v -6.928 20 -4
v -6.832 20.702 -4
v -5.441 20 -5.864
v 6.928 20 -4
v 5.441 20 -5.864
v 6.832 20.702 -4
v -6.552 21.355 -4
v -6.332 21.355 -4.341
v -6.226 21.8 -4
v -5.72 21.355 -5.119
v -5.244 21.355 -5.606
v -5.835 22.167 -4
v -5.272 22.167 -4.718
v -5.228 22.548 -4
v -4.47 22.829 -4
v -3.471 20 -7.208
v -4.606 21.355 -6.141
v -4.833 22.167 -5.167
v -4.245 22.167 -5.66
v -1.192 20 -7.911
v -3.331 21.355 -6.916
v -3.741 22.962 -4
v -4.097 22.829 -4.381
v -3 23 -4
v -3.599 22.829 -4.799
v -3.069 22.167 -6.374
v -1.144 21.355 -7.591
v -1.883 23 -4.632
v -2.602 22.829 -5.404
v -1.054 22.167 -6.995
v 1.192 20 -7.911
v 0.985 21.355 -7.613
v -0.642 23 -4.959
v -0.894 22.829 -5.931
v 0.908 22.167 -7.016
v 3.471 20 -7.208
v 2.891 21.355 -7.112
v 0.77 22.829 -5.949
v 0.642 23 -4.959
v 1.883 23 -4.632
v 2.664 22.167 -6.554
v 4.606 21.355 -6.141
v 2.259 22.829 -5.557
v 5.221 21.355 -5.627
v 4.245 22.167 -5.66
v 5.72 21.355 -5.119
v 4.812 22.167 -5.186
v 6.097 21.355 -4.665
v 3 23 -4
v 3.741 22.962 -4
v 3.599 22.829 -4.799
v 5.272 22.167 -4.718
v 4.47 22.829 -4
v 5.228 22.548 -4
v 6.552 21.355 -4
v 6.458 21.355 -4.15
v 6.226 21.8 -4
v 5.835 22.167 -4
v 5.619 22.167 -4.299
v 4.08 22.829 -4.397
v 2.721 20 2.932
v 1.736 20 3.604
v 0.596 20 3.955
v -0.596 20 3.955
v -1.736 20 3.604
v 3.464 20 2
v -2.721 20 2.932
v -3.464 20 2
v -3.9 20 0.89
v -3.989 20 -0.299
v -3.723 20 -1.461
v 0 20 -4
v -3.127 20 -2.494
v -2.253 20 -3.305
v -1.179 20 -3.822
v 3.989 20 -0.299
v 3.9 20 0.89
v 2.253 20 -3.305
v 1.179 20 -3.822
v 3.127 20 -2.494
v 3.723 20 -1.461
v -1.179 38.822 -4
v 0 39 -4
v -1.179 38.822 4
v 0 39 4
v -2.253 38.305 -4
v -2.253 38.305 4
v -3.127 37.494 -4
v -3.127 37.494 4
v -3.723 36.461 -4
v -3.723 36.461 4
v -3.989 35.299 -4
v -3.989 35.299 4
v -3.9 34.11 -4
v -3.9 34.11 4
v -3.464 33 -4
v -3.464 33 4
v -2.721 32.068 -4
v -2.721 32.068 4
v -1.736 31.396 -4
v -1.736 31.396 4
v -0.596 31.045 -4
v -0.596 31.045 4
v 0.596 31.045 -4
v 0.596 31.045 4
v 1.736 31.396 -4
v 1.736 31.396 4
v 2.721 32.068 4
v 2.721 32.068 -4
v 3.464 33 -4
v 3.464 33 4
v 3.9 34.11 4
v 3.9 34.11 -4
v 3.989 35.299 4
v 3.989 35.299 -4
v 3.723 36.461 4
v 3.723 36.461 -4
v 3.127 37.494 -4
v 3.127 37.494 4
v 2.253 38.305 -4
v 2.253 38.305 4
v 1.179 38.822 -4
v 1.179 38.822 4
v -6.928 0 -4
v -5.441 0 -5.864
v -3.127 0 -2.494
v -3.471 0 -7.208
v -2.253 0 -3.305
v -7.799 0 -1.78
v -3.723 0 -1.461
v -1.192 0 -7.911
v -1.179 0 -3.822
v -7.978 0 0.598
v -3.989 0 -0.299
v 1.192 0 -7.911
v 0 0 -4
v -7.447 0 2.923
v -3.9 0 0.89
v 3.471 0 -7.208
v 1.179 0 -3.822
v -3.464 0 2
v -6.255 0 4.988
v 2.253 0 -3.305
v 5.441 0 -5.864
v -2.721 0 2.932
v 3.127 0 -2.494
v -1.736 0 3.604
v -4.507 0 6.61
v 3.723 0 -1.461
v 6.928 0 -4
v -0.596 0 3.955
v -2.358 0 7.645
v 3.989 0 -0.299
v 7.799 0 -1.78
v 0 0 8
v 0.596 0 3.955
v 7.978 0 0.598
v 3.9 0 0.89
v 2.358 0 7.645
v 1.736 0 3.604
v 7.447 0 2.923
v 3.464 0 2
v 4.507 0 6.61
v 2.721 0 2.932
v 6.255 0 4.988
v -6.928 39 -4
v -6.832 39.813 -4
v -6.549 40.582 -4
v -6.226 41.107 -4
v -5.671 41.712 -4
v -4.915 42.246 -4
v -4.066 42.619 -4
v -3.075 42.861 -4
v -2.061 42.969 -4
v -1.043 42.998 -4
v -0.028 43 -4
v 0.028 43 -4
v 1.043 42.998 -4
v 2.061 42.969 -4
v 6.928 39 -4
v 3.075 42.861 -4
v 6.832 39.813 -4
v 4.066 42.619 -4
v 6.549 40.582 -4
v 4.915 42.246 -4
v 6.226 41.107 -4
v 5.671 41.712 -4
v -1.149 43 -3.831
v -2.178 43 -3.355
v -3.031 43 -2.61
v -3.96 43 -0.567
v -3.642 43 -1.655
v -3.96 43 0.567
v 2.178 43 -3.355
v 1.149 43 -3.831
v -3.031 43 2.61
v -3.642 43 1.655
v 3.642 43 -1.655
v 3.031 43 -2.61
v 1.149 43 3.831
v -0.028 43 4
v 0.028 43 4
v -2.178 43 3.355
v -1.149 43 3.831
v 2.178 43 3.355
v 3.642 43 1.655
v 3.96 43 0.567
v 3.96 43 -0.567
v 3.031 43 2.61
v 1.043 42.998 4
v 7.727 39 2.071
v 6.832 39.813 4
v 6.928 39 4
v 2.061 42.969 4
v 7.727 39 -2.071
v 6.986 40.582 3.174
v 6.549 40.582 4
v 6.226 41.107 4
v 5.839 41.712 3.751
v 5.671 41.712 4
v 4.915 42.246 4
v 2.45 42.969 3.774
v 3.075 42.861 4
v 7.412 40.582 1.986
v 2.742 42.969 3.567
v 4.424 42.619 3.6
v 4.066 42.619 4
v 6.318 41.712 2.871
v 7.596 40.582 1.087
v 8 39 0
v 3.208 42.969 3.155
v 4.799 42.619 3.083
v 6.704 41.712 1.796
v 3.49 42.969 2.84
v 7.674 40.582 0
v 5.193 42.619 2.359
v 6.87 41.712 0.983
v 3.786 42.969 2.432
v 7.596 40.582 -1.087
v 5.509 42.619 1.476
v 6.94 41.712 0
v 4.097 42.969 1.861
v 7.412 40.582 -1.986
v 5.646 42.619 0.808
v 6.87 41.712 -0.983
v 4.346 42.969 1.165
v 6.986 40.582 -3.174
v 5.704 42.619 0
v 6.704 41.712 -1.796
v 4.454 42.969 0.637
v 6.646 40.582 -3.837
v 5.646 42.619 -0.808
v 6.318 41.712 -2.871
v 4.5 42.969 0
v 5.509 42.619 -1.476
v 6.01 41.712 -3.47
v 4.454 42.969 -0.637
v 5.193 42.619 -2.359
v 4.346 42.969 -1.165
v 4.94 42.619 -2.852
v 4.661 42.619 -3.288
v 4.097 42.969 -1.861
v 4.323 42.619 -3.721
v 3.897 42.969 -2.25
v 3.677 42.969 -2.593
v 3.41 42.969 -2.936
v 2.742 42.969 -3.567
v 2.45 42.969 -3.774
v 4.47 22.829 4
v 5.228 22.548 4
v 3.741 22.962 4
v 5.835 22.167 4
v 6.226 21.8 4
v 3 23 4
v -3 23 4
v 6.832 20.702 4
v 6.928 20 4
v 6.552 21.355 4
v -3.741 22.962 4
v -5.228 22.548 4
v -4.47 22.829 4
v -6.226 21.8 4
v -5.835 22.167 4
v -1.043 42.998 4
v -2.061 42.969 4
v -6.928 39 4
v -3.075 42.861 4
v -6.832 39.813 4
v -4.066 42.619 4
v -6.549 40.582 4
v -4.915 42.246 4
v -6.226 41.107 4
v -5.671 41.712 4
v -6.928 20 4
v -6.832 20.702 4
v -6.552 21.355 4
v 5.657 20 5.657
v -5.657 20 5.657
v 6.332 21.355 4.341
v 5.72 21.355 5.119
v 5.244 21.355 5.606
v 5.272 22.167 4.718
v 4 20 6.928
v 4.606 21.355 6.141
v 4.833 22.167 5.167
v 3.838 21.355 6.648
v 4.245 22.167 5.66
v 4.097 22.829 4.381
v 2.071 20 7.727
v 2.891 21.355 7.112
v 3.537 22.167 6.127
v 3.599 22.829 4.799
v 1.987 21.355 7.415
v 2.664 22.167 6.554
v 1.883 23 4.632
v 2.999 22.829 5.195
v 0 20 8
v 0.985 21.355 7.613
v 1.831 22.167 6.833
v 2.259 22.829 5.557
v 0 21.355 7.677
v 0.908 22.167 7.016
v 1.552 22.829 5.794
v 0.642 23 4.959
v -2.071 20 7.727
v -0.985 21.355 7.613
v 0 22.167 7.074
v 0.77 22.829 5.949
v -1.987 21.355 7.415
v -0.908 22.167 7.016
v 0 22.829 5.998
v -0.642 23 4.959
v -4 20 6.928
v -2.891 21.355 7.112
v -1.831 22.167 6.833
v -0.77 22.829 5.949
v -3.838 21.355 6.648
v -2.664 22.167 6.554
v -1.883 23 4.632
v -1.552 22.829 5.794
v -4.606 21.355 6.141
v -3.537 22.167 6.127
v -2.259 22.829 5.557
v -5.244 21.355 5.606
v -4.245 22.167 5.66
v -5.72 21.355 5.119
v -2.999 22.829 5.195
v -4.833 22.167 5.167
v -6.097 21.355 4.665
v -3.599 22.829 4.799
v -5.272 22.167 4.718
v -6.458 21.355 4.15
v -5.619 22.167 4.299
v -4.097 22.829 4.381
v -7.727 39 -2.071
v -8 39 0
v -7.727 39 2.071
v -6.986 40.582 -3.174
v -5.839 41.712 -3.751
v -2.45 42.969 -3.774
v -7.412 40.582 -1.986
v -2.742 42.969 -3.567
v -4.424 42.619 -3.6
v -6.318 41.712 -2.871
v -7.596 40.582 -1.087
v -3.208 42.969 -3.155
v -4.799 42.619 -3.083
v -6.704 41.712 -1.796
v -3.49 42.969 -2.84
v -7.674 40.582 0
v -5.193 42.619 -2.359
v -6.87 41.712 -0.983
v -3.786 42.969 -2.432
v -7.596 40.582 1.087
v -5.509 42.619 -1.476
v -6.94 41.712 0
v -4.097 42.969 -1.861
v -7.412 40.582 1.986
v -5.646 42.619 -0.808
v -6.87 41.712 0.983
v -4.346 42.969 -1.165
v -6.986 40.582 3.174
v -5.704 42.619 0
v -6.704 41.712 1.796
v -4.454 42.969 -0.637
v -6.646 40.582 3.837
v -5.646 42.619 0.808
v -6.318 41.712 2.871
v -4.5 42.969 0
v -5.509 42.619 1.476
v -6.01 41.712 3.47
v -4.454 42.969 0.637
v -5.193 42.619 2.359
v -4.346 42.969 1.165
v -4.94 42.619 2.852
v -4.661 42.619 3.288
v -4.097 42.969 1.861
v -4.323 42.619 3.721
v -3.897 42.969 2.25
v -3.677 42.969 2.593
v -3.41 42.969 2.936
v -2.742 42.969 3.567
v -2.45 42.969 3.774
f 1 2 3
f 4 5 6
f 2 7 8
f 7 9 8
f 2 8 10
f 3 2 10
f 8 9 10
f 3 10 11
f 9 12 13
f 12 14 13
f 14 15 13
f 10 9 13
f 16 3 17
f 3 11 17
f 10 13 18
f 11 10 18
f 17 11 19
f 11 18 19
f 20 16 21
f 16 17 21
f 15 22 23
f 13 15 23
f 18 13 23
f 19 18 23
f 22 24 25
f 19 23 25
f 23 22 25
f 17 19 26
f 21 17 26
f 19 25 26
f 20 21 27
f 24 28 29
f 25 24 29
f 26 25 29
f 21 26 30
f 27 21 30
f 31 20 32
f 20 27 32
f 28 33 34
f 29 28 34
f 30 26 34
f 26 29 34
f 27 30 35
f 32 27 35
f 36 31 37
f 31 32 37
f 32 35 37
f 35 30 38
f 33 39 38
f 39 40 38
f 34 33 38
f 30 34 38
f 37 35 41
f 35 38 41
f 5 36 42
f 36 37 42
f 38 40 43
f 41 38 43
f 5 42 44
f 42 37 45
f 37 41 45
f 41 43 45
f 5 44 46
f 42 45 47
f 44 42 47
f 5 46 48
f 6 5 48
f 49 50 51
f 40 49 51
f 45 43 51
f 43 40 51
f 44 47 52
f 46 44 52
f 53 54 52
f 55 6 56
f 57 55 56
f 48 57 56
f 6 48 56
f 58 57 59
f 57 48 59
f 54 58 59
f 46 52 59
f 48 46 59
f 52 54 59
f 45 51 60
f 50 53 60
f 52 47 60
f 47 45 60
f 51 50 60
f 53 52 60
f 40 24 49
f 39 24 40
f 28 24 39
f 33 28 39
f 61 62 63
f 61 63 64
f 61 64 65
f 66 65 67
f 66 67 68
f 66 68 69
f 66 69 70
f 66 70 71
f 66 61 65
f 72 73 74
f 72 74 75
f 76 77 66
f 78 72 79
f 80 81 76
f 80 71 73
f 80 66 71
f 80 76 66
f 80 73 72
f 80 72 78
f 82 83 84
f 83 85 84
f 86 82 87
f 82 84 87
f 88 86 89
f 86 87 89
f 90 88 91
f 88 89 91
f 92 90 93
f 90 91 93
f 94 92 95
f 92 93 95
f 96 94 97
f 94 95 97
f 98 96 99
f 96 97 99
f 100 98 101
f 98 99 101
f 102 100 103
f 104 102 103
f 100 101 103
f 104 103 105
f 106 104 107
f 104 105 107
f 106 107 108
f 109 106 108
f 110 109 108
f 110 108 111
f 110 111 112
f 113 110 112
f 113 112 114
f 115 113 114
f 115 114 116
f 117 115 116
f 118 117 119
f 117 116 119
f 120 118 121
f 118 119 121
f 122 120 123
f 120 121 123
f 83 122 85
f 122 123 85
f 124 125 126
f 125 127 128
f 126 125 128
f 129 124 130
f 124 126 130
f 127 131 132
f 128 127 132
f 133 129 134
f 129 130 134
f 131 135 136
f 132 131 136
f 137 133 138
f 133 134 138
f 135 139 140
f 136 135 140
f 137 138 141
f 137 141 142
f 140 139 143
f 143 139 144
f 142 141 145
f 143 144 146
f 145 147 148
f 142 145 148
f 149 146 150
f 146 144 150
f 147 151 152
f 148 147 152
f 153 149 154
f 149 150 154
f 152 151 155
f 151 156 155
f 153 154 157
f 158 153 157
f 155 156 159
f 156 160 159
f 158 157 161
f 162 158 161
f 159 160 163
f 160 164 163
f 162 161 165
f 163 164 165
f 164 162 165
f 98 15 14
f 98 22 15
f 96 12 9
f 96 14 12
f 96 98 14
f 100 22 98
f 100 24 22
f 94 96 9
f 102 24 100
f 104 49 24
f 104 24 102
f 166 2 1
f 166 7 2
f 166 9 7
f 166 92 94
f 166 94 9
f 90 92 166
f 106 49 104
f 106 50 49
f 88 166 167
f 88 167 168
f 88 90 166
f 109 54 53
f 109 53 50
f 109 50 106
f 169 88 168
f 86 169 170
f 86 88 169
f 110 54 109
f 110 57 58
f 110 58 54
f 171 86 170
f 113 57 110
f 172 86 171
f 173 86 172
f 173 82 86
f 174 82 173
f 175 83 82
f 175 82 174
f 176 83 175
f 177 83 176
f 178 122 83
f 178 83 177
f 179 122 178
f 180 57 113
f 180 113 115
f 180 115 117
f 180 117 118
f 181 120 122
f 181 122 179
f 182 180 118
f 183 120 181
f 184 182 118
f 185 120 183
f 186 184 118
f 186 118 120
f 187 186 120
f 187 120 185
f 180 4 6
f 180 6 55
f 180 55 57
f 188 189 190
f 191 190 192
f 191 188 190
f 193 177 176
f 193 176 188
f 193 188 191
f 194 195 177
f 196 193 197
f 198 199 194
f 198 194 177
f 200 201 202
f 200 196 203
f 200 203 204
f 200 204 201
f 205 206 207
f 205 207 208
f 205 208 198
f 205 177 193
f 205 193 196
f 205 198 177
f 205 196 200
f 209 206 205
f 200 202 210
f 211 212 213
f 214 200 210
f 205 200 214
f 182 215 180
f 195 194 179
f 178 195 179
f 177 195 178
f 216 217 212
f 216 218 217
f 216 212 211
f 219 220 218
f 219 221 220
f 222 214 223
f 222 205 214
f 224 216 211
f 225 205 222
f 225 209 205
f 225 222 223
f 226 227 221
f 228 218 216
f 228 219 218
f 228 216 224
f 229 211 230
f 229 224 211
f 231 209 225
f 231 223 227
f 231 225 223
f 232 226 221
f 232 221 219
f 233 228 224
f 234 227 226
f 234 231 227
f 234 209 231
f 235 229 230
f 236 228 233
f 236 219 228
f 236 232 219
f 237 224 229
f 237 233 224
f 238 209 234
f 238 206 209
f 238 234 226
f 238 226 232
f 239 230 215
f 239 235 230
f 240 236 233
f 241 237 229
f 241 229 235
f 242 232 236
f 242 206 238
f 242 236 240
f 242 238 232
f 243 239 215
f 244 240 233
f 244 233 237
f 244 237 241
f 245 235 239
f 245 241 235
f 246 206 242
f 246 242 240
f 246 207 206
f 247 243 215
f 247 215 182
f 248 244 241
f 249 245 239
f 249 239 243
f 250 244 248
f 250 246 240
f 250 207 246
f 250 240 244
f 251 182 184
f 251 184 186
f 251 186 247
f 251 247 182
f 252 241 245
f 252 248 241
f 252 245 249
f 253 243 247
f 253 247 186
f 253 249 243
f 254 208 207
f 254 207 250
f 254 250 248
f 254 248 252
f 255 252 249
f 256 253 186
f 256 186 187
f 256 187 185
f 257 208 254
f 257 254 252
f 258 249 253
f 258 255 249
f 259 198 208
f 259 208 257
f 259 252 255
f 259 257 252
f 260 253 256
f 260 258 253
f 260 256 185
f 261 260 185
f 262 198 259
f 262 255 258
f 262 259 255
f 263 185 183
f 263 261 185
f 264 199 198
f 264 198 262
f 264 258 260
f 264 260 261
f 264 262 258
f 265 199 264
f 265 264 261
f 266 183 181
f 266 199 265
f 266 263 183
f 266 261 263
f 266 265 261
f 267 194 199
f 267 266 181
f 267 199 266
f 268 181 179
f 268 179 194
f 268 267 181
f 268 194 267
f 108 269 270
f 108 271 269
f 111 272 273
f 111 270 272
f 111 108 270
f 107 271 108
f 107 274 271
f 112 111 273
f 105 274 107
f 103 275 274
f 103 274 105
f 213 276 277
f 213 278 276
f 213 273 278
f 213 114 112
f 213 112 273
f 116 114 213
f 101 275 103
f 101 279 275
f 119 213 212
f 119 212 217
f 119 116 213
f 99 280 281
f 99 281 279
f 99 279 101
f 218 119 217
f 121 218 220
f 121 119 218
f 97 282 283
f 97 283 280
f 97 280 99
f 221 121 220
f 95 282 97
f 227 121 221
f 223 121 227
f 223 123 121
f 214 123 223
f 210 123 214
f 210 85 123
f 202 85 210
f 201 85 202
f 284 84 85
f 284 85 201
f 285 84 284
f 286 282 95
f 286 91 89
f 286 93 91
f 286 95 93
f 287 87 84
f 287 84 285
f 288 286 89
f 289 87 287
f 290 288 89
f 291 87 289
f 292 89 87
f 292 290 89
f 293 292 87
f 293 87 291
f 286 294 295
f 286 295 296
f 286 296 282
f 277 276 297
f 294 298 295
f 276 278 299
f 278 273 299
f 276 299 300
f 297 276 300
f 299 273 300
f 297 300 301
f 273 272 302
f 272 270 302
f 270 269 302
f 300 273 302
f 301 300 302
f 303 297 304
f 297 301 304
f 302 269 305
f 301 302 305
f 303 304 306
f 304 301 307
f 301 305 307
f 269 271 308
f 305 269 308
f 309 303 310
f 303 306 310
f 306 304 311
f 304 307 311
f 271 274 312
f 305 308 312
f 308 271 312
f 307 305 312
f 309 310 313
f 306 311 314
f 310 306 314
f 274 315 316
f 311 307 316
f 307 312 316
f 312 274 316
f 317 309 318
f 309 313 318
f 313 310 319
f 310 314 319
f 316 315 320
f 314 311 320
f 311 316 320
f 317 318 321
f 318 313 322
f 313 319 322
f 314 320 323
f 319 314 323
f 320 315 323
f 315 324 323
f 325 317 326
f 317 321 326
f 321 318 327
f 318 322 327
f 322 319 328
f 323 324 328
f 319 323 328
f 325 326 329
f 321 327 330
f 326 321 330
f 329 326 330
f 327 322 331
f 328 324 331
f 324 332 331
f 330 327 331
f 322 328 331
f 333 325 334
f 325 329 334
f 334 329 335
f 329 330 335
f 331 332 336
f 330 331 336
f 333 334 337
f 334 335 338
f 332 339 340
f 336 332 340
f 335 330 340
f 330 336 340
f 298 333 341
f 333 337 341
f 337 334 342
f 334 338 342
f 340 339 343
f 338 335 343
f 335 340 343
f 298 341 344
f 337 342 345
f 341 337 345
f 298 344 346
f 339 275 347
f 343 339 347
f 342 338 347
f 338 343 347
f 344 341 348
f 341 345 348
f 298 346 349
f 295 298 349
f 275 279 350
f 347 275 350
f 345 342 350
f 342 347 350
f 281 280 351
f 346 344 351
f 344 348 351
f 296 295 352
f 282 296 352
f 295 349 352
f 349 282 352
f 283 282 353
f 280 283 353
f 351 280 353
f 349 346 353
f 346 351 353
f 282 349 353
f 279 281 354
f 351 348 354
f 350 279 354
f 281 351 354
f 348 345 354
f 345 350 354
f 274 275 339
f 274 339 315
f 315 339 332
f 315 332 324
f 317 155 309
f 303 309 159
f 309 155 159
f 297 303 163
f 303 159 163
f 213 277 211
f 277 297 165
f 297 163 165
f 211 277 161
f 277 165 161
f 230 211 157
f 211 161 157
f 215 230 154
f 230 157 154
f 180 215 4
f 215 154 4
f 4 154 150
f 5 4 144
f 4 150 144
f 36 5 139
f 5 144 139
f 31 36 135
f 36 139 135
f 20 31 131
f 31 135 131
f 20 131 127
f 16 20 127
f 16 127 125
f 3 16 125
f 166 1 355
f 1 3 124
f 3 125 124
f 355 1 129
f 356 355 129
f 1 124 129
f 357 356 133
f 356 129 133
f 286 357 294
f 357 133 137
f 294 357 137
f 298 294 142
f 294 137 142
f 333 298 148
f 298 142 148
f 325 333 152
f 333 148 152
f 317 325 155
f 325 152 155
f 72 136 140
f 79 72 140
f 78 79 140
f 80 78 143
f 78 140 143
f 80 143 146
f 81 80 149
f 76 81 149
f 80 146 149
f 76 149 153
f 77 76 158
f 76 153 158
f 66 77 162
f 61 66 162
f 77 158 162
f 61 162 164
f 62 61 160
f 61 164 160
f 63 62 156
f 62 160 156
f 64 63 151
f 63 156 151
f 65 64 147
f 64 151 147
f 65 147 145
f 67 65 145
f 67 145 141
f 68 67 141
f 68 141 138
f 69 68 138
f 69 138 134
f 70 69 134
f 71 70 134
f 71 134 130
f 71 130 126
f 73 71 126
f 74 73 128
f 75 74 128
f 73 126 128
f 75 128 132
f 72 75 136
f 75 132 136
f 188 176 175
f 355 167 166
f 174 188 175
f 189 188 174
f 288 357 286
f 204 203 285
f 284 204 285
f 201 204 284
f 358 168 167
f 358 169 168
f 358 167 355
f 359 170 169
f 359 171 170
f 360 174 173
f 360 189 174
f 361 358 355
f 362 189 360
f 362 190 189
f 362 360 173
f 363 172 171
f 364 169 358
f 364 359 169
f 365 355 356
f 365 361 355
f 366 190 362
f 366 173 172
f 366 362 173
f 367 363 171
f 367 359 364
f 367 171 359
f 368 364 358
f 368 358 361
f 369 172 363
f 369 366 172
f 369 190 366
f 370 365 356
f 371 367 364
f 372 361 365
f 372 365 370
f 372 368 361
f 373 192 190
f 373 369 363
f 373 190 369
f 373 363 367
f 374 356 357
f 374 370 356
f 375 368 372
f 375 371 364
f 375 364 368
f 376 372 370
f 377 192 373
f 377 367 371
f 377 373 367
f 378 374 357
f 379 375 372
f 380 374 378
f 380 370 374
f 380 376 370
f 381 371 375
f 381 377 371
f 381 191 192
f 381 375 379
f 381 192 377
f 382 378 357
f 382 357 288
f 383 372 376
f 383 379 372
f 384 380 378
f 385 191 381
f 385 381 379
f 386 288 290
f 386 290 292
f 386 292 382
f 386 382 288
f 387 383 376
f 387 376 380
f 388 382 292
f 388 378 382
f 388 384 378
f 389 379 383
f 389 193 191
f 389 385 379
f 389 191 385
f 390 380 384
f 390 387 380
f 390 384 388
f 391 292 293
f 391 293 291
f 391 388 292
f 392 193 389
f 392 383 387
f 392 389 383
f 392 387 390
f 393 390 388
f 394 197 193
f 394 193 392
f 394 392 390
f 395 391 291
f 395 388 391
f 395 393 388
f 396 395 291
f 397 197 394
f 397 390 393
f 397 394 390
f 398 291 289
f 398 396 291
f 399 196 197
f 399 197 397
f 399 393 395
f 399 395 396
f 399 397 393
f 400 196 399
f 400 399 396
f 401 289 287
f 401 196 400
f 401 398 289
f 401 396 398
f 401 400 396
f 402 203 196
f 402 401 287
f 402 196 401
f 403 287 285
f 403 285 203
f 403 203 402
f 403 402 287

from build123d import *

# Parameters (mm, degrees)
SKETCH_1_R          = 8
EXTRUDE_1_DEPTH     = 43
SKETCH_2_W          = 4
SKETCH_2_H          = 20
CUT_EXTRUDE_1_DEPTH = 21.5
FILLET_1_R          = 3
FILLET_2_R          = 4
SKETCH_3_R          = 4
CUT_EXTRUDE_2_DEPTH = 21.5
SKETCH_4_R          = 4
CUT_EXTRUDE_3_DEPTH = 20


with BuildPart() as part:
    # 草图1 → 凸台-拉伸1 (new body)
    with BuildSketch(Plane(origin=(0, 0, 0), x_dir=(1, 0, 0), z_dir=(0, 1, 0))):
        with Locations(Location((0, 0, 0), (0, 0, 270))):
            Circle(SKETCH_1_R)
    extrude(amount=EXTRUDE_1_DEPTH)

    # 草图2 → 切除-拉伸1 (cut, symmetric)
    with BuildSketch(Plane(origin=(0, 0, 0), x_dir=(0, 0, -1), z_dir=(1, 0, 0))):
        with Locations((-6, 33)):
            Rectangle(SKETCH_2_W, SKETCH_2_H)
        with Locations((6, 33)):
            Rectangle(SKETCH_2_W, SKETCH_2_H)
    extrude(amount=CUT_EXTRUDE_1_DEPTH, both=True, mode=Mode.SUBTRACT)

    # 圆角1
    fillet_1_edges = [part.edges().sort_by_distance(p)[0] for p in [
        (-4, 23, 6.92820323),
        (0, 23, -8),
    ]]
    fillet(fillet_1_edges, radius=FILLET_1_R)

    # 圆角2
    fillet_2_edges = [part.edges().sort_by_distance(p)[0] for p in [
        (8, 43, 0),
        (-8, 43, 0),
    ]]
    fillet(fillet_2_edges, radius=FILLET_2_R - 0.0001)  # a hair under: the kernel refuses the full size

    # 草图3 → 切除-拉伸2 (cut, symmetric)
    with BuildSketch(Plane.XY.offset(4)):
        with Locations(Location((0, 35, 0), (0, 0, 90))):
            Circle(SKETCH_3_R)
    extrude(amount=CUT_EXTRUDE_2_DEPTH, both=True, mode=Mode.SUBTRACT)

    # 草图4 → 切除-拉伸3 (cut)
    with BuildSketch(Plane.XZ):
        with Locations(Location((0, 0, 0), (0, 0, 270))):
            Circle(SKETCH_4_R)
    extrude(amount=-CUT_EXTRUDE_3_DEPTH, mode=Mode.SUBTRACT)


solid = part.part
